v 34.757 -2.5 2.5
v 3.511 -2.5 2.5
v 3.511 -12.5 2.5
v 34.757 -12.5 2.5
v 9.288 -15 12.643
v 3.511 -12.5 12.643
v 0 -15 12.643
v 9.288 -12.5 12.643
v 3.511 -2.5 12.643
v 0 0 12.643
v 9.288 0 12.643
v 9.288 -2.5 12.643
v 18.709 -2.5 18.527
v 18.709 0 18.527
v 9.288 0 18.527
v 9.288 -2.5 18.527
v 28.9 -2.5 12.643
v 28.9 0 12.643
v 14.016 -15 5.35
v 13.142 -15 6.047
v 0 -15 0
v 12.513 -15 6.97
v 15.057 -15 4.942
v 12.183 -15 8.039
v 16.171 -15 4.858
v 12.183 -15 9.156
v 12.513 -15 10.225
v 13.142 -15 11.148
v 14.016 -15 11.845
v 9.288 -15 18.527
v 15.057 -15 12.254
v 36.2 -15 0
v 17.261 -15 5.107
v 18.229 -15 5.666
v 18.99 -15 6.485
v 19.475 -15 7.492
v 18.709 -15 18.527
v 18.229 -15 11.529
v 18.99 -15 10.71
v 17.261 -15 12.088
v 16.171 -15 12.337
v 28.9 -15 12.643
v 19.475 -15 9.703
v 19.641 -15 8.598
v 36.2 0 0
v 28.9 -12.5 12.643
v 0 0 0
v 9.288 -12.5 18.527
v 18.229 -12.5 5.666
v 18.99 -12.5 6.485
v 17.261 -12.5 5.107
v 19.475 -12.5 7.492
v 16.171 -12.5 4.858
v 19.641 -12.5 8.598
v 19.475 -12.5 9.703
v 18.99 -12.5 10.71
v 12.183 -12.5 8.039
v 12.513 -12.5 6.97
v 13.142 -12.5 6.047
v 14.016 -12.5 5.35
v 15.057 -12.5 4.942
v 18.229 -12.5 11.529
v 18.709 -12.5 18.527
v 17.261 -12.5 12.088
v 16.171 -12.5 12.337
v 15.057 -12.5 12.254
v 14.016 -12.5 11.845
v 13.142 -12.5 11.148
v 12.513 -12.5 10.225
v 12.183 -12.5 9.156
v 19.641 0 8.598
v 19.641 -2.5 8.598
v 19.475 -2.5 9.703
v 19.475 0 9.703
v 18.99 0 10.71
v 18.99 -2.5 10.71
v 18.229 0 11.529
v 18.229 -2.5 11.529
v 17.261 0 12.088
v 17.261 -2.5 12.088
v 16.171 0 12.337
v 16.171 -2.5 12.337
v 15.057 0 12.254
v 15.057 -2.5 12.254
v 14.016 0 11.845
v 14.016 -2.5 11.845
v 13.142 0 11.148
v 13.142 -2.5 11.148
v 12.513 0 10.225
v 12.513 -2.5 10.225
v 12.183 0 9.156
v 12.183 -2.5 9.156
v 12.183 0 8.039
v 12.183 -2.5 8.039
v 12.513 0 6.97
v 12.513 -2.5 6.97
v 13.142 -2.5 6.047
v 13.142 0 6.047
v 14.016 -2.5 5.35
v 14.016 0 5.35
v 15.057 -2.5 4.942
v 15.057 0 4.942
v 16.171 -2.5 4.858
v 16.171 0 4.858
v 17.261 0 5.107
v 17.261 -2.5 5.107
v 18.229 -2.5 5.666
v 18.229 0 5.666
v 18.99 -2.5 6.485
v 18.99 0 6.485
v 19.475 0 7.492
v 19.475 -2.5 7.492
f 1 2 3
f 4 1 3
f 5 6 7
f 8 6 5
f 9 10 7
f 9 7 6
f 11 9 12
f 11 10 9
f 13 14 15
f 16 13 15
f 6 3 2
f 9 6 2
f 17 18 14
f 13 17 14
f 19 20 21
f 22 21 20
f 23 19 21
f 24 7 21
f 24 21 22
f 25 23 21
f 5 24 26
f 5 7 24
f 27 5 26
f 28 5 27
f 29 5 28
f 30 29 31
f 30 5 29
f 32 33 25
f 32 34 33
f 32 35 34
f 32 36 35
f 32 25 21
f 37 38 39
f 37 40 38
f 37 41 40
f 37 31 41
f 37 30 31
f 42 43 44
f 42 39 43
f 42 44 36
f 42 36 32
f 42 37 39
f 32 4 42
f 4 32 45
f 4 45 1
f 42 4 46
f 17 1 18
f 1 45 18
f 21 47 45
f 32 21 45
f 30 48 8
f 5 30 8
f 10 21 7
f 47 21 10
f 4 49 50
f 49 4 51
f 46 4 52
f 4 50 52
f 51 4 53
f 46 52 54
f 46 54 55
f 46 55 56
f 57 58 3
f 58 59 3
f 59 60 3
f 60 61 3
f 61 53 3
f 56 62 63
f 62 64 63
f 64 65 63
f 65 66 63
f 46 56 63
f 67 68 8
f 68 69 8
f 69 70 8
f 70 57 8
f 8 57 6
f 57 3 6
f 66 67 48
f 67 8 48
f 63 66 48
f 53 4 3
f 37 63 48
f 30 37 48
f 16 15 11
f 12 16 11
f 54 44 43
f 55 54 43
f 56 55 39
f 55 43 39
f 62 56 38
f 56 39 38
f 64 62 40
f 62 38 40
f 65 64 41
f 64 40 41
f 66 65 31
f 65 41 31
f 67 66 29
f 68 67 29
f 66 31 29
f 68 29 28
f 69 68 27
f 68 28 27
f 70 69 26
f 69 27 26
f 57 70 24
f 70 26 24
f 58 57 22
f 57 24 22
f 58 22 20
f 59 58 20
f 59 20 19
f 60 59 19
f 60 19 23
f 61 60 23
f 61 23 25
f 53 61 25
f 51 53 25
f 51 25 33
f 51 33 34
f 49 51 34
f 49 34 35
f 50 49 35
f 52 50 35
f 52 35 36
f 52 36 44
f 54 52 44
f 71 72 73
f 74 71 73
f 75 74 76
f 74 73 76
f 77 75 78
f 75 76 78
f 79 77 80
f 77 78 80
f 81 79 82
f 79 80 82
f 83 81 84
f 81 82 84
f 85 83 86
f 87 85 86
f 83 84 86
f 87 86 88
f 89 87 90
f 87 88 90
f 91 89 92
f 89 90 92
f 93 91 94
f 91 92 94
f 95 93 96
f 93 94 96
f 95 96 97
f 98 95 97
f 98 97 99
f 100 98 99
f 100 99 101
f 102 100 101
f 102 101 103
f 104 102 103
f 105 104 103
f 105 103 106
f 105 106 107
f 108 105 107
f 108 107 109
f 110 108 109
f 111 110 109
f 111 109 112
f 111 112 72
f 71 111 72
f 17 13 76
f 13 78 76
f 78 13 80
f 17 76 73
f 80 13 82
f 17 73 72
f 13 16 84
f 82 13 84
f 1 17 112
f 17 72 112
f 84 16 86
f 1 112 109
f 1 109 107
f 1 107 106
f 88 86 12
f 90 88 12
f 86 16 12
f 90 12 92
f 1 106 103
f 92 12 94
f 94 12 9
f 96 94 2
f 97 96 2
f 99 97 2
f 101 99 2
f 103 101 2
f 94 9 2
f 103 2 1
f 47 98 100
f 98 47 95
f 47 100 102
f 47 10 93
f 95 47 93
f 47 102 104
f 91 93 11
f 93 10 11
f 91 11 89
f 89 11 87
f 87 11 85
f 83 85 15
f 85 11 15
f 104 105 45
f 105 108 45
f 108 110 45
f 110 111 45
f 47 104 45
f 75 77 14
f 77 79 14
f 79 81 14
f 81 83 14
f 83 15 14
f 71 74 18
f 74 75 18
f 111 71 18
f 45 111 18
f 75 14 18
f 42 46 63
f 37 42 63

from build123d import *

# Parameters (mm, degrees)
F1_DEPTH = 15
F2_W     = 10
F2_H     = 10.395046
F2_H_2   = 10.143298
F3_DEPTH = 40
F4_W     = 3.51127
F4_H     = 10
F5_DEPTH = 10.143298
F6_R     = 3.75
F7_DEPTH = 25


with BuildPart() as f1:
    # F0 (on Front) → F1 (new body)
    with BuildSketch(Plane.XZ):
        Polygon((0, 12.643298), (0, 0), (36.2, 0), (28.900388, 12.643298), (18.709274, 18.527141), (9.287707, 18.527141), (9.287707, 12.643298), align=None)
    extrude(amount=F1_DEPTH)

    # F2 (on face) → F3 (cut)
    with BuildSketch(Plane(origin=(0, 0, 0), x_dir=(0, -1, 0), z_dir=(-1, 0, 0))):
        with Locations((7.5, 17.840821)):
            Rectangle(F2_W, F2_H)
        with Locations((7.5, 7.571649)):
            Rectangle(F2_W, F2_H_2)
    extrude(amount=-F3_DEPTH, mode=Mode.SUBTRACT)

    # F4 (on face) → F5 (join, through all)
    with BuildSketch(Plane.XY.offset(2.5)):
        with Locations((1.755635, -7.5)):
            Rectangle(F4_W, F4_H)
    extrude(amount=F5_DEPTH)

    # F6 (on face) → F7 (cut)
    with BuildSketch(Plane.XZ.offset(15)):
        with Locations((15.891228, 8.597537)):
            Circle(F6_R)
    extrude(amount=-F7_DEPTH, mode=Mode.SUBTRACT)


solid = f1.part
